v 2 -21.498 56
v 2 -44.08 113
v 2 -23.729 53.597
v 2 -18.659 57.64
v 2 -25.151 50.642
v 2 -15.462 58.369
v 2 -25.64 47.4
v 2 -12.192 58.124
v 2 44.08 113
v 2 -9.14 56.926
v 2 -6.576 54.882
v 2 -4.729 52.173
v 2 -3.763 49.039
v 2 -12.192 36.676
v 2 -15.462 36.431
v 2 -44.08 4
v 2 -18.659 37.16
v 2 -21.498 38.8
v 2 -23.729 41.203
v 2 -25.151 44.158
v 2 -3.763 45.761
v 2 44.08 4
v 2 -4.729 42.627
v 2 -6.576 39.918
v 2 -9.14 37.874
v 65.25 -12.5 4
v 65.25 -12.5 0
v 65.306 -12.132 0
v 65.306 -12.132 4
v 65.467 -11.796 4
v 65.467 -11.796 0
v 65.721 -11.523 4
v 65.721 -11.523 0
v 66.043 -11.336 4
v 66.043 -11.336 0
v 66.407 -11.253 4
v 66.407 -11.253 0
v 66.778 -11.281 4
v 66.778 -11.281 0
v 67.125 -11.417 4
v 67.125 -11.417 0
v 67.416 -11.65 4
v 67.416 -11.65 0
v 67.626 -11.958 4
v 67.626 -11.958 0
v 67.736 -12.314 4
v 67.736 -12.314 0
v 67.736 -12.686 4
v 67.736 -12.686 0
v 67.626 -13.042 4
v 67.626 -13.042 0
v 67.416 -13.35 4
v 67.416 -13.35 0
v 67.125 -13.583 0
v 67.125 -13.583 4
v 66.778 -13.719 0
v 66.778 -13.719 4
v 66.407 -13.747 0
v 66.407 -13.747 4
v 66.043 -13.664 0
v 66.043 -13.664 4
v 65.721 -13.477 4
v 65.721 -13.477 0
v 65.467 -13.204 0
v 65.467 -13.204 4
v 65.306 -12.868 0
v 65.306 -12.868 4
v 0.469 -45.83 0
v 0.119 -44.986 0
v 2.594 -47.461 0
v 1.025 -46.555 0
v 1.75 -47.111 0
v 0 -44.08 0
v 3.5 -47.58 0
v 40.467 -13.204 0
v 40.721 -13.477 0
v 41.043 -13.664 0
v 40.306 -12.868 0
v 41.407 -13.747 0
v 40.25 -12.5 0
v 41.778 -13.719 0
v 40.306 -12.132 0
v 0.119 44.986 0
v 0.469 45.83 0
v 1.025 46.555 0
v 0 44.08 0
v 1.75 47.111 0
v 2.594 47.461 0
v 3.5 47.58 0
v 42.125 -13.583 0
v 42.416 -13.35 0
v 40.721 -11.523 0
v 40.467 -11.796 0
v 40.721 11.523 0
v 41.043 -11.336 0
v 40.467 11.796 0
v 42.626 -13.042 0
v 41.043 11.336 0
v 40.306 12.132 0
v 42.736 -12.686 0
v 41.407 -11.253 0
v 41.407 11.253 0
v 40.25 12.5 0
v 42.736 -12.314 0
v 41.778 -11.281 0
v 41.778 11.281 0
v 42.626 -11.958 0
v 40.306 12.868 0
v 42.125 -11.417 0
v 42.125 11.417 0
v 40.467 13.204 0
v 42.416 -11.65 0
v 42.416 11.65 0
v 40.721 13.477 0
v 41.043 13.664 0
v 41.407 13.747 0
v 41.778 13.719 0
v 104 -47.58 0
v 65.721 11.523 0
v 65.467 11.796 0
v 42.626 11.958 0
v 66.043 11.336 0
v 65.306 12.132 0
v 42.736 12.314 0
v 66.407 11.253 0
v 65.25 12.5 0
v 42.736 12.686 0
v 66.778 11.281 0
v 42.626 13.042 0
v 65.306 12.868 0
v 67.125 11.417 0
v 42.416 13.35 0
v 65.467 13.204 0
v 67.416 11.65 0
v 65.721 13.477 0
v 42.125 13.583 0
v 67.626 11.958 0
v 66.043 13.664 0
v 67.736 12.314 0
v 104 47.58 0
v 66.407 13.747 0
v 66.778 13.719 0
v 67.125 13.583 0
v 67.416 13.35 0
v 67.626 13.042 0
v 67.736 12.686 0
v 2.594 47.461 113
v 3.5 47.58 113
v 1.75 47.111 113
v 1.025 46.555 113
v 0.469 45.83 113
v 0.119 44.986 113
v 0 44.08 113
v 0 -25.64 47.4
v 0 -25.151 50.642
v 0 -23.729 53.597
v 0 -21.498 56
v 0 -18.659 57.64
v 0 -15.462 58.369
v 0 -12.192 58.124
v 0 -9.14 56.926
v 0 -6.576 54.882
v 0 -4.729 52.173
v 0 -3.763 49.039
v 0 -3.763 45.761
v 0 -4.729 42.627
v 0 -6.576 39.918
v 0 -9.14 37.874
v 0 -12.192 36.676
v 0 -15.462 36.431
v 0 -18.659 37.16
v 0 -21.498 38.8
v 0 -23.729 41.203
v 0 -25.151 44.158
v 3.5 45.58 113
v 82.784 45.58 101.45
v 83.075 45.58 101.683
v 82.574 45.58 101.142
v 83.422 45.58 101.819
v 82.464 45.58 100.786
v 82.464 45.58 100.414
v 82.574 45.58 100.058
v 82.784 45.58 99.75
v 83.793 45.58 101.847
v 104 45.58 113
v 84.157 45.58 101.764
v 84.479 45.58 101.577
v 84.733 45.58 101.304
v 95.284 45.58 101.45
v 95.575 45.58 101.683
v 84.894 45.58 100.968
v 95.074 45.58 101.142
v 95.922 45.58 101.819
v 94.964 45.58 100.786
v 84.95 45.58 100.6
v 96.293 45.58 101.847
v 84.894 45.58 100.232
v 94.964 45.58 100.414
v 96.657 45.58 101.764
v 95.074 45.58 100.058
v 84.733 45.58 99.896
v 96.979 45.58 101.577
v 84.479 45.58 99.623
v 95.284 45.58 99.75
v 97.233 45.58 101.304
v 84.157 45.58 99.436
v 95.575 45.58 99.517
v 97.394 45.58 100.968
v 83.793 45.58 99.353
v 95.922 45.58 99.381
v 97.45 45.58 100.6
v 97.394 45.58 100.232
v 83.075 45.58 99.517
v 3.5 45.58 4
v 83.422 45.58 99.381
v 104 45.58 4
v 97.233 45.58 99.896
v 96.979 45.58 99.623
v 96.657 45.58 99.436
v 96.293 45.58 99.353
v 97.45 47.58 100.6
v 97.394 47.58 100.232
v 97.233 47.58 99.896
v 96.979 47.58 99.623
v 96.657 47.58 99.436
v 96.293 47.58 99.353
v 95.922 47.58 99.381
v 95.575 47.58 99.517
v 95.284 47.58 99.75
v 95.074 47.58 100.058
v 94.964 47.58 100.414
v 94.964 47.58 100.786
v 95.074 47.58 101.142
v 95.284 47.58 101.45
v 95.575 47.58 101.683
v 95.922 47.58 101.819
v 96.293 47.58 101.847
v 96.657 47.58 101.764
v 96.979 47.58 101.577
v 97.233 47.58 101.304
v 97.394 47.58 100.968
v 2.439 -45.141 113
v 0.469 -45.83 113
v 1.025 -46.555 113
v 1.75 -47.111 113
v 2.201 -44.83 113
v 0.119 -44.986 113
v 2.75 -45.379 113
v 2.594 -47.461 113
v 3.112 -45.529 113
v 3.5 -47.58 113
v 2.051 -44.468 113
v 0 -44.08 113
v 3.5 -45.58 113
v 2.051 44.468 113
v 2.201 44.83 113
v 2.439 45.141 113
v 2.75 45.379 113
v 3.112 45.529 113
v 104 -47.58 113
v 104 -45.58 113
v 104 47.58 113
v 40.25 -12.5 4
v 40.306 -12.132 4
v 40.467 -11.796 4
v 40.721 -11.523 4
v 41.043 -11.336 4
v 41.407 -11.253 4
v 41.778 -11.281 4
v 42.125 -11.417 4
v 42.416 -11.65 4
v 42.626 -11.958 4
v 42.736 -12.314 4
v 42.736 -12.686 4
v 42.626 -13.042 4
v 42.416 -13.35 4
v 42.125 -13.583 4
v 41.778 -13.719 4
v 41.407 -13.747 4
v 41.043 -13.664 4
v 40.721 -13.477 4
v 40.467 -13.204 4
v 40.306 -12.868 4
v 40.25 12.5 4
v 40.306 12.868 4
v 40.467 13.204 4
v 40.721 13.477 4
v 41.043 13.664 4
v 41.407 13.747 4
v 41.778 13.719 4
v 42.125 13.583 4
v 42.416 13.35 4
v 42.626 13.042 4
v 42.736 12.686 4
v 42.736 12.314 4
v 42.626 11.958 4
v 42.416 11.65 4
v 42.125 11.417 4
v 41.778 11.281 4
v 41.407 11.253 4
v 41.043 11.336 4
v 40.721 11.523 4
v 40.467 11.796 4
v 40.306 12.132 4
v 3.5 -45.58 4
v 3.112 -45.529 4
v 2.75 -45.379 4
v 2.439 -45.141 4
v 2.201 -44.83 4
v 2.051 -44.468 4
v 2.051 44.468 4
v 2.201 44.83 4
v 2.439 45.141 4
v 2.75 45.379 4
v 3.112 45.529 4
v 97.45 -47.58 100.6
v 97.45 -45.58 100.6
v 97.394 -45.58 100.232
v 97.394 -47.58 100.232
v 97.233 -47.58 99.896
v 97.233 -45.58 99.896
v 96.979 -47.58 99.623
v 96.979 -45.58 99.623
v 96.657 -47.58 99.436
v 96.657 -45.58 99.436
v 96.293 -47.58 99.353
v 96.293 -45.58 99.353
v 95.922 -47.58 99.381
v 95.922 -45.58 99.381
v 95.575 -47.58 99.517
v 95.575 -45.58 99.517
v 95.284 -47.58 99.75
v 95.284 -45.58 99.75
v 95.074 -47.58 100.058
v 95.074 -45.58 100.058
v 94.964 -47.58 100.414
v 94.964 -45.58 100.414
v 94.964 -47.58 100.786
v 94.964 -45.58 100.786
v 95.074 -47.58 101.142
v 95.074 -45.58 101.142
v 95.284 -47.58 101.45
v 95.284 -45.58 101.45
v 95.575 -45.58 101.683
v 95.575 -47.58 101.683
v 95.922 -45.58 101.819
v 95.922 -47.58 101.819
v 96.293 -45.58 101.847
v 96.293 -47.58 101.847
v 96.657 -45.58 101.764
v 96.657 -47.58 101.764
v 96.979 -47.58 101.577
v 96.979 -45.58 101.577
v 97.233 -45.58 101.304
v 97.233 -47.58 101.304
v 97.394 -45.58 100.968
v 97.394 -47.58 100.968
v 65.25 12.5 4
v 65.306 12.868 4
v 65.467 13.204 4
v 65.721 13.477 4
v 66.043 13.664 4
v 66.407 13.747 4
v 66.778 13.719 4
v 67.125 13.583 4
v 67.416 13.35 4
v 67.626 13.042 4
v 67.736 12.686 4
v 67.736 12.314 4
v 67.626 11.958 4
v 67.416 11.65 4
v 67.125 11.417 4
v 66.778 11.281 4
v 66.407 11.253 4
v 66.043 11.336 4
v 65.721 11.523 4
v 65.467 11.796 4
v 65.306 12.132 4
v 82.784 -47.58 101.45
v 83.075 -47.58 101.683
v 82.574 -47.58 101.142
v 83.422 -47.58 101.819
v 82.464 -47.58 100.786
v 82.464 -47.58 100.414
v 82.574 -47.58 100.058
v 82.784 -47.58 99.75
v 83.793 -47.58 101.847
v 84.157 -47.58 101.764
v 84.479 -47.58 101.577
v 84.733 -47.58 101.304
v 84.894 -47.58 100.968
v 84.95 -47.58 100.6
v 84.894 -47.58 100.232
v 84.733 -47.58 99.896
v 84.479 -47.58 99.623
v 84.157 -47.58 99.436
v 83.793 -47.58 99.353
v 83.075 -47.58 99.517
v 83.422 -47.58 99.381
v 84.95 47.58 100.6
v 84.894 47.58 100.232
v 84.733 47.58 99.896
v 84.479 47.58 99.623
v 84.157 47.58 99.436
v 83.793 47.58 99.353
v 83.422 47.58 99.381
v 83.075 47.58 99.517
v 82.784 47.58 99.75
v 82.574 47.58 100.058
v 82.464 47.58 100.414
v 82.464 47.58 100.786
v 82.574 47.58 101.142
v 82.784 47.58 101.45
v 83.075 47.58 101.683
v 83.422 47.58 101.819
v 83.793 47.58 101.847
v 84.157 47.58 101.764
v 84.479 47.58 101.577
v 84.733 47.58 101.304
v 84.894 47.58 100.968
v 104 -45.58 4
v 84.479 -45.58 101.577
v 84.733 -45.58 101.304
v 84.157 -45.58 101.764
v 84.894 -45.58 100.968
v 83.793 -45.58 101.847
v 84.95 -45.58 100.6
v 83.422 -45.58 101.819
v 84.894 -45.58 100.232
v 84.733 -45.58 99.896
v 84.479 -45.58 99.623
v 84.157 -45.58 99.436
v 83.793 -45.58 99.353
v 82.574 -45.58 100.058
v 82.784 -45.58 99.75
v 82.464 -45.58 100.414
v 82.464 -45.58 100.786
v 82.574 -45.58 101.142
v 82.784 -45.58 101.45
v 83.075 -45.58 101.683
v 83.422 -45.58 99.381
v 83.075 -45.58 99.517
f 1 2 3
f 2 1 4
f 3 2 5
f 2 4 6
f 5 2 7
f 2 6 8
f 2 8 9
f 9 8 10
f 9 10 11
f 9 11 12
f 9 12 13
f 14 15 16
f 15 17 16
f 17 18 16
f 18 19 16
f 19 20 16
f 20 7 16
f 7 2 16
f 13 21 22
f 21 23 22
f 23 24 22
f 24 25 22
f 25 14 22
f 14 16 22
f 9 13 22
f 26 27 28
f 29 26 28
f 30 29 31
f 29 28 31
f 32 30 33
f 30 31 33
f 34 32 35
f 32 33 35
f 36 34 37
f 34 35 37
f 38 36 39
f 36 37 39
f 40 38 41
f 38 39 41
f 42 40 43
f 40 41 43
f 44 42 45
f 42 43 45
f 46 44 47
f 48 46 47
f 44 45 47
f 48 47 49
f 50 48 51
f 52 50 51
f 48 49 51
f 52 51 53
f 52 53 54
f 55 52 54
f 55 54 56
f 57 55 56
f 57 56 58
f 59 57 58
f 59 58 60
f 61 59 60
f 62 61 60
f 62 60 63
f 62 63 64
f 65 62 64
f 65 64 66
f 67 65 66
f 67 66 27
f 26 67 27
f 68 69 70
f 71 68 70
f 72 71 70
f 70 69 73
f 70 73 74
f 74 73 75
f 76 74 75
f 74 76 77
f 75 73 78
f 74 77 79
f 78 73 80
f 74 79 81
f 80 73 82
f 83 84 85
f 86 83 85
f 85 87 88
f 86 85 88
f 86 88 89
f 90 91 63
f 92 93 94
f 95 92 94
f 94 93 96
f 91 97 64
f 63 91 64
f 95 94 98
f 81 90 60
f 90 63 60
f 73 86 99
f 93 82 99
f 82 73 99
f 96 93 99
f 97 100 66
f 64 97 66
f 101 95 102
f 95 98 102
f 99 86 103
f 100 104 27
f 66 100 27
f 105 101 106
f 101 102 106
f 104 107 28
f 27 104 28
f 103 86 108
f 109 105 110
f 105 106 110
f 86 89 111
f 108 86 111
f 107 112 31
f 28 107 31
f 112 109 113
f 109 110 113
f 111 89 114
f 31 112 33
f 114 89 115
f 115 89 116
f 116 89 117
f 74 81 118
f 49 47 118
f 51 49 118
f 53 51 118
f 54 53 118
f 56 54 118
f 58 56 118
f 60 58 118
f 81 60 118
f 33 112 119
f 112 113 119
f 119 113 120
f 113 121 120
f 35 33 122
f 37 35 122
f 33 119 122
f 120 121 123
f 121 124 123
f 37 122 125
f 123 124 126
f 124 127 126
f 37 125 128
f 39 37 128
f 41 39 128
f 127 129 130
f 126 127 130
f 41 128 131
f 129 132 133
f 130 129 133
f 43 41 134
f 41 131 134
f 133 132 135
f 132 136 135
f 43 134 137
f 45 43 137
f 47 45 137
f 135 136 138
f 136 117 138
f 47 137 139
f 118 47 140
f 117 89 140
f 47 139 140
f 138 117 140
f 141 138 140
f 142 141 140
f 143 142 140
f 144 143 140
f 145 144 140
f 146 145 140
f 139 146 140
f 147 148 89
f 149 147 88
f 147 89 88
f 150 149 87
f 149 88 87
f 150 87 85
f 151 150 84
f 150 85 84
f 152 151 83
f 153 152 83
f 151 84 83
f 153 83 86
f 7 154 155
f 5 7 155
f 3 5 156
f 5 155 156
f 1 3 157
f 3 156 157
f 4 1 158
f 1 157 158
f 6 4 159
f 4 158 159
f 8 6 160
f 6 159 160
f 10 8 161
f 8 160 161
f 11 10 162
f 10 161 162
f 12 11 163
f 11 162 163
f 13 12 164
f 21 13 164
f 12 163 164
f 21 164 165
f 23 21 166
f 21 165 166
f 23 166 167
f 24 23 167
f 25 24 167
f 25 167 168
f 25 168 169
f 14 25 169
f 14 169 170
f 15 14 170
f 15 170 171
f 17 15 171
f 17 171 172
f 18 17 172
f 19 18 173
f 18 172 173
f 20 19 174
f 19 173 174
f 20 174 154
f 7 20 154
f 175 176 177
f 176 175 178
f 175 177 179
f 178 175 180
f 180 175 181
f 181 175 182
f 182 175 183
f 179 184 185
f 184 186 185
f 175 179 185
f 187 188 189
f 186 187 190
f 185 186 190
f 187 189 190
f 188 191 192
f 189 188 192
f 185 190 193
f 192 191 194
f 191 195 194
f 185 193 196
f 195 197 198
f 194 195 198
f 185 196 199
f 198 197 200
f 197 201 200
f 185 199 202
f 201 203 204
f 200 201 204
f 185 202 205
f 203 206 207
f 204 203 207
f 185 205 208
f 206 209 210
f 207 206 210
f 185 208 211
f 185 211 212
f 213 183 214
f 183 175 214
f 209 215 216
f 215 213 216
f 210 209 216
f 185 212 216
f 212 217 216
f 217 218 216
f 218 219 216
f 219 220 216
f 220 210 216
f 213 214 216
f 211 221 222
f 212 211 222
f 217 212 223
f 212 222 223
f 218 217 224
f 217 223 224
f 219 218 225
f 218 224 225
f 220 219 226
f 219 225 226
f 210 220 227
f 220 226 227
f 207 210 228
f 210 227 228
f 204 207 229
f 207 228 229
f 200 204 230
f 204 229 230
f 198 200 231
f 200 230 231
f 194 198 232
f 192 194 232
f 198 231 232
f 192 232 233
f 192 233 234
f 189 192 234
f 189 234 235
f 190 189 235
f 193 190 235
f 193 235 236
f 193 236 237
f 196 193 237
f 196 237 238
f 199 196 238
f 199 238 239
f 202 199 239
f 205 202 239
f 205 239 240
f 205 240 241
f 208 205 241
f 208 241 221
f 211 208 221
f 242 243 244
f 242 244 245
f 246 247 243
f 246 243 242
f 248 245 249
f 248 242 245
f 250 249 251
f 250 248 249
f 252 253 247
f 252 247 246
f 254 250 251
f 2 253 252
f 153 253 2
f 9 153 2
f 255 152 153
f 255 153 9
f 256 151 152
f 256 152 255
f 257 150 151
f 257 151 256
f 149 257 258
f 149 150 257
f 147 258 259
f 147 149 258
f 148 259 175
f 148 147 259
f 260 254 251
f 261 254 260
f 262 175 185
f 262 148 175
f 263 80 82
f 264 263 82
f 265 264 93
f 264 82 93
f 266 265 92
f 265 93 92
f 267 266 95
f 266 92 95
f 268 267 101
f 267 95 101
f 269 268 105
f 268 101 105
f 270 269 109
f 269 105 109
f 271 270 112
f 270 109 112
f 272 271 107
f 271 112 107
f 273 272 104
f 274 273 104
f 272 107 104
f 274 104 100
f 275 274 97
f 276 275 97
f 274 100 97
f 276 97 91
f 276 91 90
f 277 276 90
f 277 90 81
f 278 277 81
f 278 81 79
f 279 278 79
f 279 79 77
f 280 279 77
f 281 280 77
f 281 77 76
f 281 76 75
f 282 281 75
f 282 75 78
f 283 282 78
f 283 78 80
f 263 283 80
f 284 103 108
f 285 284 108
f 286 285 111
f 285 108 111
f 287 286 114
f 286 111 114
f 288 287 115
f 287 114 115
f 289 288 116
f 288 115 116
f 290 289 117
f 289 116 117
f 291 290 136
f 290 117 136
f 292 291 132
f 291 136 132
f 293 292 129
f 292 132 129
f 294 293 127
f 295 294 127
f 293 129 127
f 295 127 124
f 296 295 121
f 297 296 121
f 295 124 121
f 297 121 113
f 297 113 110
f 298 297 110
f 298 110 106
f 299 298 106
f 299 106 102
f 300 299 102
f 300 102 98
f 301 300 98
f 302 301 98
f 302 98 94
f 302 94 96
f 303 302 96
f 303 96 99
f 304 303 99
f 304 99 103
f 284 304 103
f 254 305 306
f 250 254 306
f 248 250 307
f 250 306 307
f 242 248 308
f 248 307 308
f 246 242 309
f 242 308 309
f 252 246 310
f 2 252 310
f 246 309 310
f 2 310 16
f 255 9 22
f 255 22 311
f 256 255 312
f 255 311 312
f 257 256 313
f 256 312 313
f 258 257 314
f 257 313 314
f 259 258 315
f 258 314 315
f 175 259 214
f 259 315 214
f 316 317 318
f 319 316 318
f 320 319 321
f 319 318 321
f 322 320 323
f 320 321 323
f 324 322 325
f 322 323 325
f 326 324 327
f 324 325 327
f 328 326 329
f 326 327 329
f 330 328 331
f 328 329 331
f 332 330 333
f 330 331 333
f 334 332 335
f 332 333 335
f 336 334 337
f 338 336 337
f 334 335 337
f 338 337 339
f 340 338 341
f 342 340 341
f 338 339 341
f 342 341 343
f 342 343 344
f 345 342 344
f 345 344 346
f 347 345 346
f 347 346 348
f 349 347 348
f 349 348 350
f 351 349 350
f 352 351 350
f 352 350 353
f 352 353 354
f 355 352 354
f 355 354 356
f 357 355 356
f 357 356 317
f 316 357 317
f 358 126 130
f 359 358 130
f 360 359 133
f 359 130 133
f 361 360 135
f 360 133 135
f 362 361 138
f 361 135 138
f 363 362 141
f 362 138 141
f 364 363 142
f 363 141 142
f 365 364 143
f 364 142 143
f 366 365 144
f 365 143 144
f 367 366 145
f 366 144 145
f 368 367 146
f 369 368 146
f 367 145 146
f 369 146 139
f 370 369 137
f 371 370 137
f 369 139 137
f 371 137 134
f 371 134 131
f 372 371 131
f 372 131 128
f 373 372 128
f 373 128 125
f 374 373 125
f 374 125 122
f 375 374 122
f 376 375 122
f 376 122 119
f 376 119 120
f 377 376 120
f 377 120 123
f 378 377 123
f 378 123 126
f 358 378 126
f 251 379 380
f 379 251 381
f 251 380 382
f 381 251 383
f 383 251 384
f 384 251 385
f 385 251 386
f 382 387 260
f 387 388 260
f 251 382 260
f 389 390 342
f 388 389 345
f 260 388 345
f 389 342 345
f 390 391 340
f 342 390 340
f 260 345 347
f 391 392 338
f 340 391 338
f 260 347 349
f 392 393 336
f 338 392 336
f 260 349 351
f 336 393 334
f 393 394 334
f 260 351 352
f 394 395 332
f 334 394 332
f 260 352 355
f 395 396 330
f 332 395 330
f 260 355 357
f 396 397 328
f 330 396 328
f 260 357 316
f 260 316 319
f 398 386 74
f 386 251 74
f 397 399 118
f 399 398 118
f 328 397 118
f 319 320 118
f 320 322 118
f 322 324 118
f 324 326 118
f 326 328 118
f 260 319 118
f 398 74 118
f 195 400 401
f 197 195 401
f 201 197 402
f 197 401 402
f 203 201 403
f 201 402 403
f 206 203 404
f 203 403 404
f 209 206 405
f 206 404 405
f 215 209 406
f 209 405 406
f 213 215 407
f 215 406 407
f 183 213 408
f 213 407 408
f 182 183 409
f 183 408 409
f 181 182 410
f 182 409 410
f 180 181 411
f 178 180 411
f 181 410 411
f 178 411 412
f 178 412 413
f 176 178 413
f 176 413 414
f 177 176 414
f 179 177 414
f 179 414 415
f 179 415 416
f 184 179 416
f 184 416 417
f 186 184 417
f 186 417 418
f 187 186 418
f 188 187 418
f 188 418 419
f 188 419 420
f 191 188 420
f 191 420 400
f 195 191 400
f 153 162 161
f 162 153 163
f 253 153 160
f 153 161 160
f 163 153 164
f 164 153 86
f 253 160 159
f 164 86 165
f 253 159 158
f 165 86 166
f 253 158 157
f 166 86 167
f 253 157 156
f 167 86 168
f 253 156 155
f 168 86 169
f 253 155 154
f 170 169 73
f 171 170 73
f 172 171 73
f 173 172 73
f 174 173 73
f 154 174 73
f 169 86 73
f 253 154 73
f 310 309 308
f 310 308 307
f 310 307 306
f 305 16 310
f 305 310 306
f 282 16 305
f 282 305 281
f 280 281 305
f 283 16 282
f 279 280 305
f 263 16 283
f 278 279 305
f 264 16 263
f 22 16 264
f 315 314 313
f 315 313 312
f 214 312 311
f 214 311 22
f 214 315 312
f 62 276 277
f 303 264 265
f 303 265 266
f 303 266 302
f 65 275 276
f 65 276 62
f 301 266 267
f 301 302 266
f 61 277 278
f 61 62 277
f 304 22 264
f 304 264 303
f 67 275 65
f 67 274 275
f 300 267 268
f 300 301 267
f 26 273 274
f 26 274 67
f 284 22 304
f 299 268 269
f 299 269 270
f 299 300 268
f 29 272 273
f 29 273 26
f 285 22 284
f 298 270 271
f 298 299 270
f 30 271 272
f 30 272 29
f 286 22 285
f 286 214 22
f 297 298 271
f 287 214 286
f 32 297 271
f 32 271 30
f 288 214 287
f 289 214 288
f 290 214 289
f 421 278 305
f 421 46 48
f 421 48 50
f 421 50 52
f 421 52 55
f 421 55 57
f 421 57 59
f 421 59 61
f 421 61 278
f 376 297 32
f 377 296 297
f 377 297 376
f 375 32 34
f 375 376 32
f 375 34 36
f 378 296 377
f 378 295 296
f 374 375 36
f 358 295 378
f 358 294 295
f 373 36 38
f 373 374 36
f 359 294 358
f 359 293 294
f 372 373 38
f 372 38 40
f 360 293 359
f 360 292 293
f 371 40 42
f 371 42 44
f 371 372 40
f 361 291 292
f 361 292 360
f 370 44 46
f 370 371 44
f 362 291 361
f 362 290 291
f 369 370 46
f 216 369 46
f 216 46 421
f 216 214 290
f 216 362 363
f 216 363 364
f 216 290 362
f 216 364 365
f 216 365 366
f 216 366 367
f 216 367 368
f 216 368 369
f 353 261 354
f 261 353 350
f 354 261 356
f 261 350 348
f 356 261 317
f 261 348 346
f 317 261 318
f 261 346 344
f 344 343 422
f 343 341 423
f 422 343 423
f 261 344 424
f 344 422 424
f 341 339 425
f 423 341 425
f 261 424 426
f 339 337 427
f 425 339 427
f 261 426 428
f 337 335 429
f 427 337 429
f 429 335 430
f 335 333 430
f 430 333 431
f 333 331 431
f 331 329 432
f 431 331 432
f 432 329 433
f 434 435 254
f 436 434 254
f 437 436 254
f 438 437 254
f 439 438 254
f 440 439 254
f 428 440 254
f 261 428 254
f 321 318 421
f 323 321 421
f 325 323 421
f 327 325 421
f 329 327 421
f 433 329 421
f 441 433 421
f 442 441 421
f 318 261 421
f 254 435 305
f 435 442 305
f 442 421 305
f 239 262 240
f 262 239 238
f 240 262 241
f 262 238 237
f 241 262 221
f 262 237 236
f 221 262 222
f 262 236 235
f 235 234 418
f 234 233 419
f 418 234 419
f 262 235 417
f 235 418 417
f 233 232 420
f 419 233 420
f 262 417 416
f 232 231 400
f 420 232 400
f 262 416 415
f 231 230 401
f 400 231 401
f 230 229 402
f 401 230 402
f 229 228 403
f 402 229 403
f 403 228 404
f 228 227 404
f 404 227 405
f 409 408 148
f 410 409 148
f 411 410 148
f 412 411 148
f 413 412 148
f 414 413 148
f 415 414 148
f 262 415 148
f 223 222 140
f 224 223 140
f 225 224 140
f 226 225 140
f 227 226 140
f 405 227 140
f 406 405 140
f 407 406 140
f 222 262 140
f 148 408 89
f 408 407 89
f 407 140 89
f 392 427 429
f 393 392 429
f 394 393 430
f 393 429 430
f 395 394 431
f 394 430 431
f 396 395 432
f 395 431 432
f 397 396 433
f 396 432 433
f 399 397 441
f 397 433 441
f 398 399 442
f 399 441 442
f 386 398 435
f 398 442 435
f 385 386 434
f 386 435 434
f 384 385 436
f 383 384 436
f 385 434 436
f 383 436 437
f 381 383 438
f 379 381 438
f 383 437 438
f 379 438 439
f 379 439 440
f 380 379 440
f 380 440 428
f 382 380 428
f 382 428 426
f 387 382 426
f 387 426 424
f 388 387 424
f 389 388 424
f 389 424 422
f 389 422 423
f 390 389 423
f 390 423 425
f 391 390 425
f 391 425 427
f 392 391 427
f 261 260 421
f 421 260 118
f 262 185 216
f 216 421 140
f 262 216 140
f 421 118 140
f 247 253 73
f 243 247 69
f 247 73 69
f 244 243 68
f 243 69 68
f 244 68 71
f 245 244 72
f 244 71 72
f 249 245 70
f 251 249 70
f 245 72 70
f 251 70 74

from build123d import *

# Parameters (mm, degrees)
SM_BASE_FLANGE_1_DEPTH = 113
EXTRUDE_1_DEPTH        = 4
HOLE_WIZARD_M3_1_D     = 2.5
SKETCH_10_R            = 11
CUT_EXTRUDE_1_DEPTH    = 2
HOLE_WIZARD_M3_2_D     = 2.5


# Sheet-metal steps are written as plain solids
with BuildPart() as part:
    # Sketch 1 → 基体-法兰1 (new body)
    with BuildSketch(Plane.XY):
        with BuildLine():
            Line((104, 47.58), (3.5, 47.58))
            ThreePointArc((3.5, 47.58), (1.025126266, 46.554873734), (0, 44.08))
            Line((0, 44.08), (0, -44.08))
            ThreePointArc((0, -44.08), (1.025126266, -46.554873734), (3.5, -47.58))
            Line((3.5, -47.58), (104, -47.58))
            Line((104, -47.58), (104, -45.58))
            Line((104, -45.58), (3.5, -45.58))
            ThreePointArc((3.5, -45.58), (2.439339828, -45.140660172), (2, -44.08))
            Line((2, -44.08), (2, 44.08))
            ThreePointArc((2, 44.08), (2.439339828, 45.140660172), (3.5, 45.58))
            Line((3.5, 45.58), (104, 45.58))
            Line((104, 45.58), (104, 47.58))
        make_face()
    extrude(amount=SM_BASE_FLANGE_1_DEPTH)

    # 草图6 → 凸台-拉伸1 (add)
    with BuildSketch(Plane.XY):
        with BuildLine():
            Line((104, 45.58), (3.5, 45.58))
            ThreePointArc((3.5, 45.58), (2.439339828, 45.140660172), (2, 44.08))
            Line((2, 44.08), (2, -44.08))
            ThreePointArc((2, -44.08), (2.439339828, -45.140660172), (3.5, -45.58))
            Line((3.5, -45.58), (104, -45.58))
            Line((104, -45.58), (104, 45.58))
        make_face()
    extrude(amount=EXTRUDE_1_DEPTH)

    # M3 螺纹孔1 (through all)
    with Locations(Plane(origin=(0, -47.58, 0), x_dir=(-1, 0, 0), z_dir=(0, -1, 0))):
        with Locations((-83.7, -100.6), (-96.2, -100.6)):
            Hole(HOLE_WIZARD_M3_1_D / 2)

    # 草图10 → 切除-拉伸1 (cut)
    with BuildSketch(Plane.ZY):
        with Locations(Location((47.4, -14.64, 0), (0, 0, 270))):
            Circle(SKETCH_10_R)
    extrude(amount=-CUT_EXTRUDE_1_DEPTH, mode=Mode.SUBTRACT)

    # M3 螺纹孔2 (through all)
    with Locations(Plane.XY.offset(4)):
        with Locations((41.5, 12.5), (66.5, 12.5), (66.5, -12.5), (41.5, -12.5)):
            Hole(HOLE_WIZARD_M3_2_D / 2)


solid = part.part
